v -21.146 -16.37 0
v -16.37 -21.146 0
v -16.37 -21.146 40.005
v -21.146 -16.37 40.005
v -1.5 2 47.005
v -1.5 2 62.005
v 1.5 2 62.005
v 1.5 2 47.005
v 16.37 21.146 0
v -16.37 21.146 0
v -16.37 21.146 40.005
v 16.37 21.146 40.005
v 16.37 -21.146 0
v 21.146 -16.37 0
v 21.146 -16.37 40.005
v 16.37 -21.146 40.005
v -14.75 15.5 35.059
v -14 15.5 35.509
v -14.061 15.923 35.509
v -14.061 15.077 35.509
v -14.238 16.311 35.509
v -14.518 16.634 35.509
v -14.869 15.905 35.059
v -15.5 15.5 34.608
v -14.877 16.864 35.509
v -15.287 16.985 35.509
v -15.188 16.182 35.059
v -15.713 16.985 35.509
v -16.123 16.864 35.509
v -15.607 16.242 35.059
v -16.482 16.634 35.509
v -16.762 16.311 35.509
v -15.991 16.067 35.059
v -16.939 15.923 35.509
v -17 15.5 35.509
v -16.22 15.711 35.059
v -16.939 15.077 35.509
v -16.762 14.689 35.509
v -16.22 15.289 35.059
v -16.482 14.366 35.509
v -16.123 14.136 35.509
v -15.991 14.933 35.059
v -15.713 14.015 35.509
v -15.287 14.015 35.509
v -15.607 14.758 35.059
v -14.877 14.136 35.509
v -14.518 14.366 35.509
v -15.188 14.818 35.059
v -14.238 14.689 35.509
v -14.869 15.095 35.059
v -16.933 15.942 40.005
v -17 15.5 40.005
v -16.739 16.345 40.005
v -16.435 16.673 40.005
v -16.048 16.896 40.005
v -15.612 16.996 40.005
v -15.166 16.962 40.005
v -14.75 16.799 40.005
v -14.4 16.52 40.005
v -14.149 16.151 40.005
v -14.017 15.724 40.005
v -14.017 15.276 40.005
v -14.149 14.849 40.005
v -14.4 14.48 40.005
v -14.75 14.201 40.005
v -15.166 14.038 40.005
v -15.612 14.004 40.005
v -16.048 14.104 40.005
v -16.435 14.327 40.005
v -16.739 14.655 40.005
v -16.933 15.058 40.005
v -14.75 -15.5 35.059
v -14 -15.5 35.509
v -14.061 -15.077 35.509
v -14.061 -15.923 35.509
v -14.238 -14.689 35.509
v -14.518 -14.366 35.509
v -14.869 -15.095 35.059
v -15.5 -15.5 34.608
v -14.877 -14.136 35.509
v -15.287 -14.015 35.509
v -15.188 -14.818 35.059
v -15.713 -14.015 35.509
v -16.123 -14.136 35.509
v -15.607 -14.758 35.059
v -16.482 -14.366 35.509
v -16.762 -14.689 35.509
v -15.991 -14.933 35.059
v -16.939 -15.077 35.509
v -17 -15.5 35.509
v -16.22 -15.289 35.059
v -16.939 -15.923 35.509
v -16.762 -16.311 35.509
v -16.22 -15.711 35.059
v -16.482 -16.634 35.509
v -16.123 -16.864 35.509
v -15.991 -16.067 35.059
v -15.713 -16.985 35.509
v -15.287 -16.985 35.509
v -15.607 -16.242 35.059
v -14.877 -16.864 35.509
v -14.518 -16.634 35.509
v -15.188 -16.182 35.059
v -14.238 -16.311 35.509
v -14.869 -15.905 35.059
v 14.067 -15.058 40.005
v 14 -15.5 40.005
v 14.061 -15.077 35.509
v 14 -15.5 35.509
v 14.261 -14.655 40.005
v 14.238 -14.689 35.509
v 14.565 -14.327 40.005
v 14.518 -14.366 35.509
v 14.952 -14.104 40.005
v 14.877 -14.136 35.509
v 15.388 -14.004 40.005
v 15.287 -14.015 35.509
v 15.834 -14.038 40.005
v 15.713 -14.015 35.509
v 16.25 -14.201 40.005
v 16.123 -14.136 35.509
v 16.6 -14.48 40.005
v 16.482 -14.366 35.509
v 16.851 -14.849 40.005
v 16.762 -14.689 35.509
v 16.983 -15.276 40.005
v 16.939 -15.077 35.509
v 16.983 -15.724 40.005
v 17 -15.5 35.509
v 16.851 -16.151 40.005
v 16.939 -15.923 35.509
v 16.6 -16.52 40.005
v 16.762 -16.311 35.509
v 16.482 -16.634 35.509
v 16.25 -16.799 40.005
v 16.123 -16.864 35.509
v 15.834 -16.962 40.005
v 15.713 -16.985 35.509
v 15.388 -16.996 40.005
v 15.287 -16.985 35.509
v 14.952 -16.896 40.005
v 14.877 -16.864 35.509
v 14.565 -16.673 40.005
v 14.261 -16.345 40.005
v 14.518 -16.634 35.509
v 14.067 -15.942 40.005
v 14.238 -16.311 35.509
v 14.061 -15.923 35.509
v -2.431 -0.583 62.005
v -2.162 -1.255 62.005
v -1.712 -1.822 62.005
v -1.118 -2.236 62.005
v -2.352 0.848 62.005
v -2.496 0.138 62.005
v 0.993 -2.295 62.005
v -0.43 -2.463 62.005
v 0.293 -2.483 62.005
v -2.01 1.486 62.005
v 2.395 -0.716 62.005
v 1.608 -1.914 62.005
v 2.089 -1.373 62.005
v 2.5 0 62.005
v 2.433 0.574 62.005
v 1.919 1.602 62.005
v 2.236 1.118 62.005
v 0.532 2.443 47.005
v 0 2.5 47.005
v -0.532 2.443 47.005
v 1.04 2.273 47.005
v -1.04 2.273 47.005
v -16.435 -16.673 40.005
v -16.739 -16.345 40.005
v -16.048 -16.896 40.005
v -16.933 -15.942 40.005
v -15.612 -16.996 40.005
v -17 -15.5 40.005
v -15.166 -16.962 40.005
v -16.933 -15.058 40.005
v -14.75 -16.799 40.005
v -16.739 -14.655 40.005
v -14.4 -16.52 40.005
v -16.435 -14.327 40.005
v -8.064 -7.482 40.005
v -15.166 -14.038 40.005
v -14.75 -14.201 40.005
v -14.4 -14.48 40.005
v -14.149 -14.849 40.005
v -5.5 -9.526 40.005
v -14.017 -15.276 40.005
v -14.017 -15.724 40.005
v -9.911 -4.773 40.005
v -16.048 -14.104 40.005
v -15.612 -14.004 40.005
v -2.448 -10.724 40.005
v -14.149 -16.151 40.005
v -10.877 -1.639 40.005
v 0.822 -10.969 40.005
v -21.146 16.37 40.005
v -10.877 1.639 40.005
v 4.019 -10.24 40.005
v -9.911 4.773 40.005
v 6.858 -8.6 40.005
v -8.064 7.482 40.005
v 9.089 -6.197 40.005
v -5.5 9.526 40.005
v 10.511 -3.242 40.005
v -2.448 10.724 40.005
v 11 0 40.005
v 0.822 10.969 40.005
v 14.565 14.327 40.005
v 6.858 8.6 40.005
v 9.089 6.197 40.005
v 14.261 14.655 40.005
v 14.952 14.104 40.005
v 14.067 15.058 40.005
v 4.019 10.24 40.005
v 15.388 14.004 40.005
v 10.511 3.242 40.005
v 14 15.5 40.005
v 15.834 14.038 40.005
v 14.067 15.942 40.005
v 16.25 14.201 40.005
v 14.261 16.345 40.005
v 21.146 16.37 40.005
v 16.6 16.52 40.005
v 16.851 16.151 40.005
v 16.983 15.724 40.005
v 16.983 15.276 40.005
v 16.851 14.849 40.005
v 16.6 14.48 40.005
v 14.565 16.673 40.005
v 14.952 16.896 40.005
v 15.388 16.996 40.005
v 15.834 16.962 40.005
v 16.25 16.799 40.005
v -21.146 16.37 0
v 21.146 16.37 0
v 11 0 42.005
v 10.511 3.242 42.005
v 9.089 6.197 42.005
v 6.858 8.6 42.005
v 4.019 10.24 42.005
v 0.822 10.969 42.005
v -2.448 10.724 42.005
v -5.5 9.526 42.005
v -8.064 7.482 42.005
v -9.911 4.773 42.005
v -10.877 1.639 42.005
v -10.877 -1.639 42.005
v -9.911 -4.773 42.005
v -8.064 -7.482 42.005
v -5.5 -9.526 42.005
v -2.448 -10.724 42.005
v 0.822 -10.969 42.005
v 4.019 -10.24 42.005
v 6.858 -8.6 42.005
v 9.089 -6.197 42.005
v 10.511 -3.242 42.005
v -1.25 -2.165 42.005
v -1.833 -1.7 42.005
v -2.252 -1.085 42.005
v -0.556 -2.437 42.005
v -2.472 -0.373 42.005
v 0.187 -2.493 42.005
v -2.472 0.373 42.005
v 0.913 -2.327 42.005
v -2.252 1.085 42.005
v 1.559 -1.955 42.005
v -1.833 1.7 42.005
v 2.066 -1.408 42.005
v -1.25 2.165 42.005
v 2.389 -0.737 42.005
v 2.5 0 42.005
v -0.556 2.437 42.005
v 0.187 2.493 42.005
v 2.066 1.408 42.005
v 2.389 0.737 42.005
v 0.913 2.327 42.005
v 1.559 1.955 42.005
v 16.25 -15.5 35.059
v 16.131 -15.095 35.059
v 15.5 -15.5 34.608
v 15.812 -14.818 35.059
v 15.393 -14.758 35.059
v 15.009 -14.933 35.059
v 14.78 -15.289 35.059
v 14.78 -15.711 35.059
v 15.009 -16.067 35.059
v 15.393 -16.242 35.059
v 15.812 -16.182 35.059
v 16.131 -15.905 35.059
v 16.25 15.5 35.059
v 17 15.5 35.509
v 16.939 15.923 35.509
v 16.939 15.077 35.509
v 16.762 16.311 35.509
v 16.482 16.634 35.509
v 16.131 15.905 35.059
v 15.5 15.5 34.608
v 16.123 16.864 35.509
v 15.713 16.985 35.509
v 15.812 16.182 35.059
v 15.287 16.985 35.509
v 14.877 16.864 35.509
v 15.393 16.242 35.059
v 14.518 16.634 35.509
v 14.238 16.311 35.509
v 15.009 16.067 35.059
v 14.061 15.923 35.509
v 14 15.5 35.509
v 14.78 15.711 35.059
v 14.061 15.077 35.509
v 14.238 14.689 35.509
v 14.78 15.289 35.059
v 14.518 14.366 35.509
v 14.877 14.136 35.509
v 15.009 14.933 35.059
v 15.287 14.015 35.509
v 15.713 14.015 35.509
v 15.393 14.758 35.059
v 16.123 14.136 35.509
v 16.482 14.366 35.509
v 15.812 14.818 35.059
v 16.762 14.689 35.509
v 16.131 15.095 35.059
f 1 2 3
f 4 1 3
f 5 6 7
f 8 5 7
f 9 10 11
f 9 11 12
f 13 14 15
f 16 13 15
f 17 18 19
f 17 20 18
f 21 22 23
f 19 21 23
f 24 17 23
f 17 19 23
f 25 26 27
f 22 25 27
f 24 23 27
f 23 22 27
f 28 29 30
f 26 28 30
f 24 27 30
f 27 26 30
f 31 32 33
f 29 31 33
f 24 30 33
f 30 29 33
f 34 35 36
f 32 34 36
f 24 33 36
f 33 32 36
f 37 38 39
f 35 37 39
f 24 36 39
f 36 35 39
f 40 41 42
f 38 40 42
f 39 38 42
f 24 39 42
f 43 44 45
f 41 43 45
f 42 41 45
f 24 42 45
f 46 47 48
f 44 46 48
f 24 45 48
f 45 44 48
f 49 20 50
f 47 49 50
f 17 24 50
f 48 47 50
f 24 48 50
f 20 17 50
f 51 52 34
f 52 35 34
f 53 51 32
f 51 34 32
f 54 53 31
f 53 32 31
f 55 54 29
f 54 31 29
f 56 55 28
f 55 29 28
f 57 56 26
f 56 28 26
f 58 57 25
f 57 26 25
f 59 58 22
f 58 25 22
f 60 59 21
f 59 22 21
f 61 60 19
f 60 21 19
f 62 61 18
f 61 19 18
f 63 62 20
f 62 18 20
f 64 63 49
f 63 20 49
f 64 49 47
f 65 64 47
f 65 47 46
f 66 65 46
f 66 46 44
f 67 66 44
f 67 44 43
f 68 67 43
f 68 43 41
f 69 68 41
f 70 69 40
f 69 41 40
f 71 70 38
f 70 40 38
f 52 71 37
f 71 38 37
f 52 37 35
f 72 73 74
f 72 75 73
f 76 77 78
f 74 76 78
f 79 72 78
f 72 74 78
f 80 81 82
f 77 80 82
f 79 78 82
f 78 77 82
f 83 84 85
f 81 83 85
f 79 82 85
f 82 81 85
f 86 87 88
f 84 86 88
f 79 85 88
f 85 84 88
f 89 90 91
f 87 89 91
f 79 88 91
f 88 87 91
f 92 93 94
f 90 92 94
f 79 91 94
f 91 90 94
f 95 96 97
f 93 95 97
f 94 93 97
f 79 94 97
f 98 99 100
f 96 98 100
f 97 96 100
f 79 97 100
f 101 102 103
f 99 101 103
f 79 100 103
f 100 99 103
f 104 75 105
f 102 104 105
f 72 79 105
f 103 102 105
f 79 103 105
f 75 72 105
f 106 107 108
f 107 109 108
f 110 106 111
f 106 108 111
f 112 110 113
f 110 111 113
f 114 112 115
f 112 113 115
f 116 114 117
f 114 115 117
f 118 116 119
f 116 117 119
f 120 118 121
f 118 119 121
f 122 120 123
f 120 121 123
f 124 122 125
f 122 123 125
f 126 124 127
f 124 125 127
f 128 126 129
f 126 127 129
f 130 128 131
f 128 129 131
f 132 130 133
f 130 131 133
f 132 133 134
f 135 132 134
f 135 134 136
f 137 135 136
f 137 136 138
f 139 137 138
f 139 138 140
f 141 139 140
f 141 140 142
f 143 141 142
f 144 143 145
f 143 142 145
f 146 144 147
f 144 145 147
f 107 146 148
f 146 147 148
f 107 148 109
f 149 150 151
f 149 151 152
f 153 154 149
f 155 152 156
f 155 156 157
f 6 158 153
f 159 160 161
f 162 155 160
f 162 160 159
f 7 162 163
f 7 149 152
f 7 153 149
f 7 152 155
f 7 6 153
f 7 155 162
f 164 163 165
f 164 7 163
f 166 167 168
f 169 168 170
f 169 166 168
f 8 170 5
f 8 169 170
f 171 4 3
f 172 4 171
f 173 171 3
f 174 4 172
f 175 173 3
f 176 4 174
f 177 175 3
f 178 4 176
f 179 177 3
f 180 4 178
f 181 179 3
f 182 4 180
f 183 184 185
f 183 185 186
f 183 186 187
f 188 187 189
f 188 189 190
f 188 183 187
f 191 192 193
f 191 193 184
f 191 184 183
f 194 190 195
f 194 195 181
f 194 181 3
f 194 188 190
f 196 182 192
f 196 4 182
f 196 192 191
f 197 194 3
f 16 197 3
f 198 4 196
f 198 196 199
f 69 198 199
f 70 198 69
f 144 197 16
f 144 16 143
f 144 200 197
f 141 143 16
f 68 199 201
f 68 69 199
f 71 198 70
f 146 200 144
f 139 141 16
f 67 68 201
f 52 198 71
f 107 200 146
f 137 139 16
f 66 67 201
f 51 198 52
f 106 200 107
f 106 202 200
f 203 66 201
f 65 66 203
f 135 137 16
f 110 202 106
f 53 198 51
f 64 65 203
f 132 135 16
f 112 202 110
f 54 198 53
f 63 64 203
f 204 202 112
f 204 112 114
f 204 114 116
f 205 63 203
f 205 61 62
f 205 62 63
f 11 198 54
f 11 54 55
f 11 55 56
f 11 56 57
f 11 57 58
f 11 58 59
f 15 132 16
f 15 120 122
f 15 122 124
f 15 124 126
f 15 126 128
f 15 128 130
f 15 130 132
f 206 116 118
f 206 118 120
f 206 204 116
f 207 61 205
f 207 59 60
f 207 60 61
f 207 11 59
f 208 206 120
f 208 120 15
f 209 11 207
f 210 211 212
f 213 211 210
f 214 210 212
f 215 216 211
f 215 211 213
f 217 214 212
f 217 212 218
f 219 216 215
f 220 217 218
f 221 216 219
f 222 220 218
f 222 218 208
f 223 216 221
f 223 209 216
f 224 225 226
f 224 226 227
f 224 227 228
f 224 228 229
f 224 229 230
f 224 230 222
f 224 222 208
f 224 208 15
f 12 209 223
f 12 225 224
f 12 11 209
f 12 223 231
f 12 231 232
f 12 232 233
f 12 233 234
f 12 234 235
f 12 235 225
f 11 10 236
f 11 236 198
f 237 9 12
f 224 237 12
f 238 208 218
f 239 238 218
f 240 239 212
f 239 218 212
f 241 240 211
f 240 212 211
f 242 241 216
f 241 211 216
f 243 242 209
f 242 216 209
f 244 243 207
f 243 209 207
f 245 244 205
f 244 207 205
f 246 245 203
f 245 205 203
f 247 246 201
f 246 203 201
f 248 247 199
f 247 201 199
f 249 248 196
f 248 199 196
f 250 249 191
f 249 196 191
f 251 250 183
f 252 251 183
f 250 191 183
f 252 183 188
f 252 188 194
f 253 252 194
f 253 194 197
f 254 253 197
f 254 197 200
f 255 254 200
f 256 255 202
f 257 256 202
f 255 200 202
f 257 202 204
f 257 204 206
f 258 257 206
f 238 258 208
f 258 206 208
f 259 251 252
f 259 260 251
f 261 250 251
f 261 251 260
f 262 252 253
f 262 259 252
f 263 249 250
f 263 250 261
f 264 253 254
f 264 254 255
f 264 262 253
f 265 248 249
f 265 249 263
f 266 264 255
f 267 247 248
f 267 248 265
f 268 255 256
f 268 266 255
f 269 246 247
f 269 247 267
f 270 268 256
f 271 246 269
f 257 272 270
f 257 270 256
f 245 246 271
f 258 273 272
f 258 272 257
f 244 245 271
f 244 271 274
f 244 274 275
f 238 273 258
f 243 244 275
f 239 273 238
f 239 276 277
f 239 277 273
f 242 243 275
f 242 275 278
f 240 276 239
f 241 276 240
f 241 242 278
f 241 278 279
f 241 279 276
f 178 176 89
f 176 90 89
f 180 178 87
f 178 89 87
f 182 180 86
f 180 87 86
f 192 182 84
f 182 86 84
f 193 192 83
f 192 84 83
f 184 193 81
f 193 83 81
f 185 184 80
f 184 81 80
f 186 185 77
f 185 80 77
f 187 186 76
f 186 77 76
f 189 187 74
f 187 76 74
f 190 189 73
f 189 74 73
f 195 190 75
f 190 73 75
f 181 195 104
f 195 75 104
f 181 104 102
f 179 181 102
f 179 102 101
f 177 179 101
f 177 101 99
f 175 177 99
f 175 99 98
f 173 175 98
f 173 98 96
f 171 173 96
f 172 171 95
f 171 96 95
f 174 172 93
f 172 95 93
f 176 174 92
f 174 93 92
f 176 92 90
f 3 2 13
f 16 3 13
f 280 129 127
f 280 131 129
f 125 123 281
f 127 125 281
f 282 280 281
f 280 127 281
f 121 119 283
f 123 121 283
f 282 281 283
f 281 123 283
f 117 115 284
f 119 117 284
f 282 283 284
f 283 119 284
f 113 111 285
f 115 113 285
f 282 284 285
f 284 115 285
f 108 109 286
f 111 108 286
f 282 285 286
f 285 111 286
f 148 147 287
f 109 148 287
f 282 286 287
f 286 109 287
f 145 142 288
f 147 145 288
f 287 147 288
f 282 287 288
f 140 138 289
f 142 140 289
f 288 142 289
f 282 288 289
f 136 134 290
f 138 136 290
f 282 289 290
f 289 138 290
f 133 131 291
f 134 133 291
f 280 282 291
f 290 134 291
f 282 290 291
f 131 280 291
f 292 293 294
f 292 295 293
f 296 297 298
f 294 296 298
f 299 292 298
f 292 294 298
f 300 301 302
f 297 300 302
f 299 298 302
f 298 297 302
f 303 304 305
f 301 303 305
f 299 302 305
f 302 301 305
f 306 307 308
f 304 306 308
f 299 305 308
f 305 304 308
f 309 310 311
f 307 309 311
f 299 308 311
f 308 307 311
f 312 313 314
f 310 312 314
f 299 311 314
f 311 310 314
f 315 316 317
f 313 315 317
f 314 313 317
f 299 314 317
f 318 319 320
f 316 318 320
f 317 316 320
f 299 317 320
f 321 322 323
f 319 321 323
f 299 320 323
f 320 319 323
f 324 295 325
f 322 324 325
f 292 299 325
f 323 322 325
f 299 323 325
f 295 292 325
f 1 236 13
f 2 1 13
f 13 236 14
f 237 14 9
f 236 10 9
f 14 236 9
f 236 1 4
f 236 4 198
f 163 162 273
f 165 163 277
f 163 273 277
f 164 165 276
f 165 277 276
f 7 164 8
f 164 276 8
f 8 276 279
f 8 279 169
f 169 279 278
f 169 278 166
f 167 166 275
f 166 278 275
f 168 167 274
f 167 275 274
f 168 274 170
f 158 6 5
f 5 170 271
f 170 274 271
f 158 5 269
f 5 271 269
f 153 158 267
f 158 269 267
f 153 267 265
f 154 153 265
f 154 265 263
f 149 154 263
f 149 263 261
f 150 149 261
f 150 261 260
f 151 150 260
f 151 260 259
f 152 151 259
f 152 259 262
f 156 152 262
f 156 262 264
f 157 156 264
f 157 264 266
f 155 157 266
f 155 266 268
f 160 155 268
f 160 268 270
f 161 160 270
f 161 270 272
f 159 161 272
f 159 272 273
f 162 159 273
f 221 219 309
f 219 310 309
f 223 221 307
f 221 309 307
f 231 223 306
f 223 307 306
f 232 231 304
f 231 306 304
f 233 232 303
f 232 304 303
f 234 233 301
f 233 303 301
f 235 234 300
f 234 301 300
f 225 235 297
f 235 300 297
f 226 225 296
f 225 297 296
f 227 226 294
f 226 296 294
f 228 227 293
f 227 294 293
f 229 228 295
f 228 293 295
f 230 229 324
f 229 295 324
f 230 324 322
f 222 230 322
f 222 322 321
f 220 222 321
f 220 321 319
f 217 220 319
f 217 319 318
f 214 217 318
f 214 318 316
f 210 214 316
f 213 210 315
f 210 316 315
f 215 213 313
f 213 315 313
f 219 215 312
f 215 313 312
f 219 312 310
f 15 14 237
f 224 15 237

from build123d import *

# Parameters (mm, degrees)
F0_W      = 42.291
F0_H      = 42.291
F1_DEPTH  = 40.005
F2_SIZE   = 4.7752
F3_R      = 11
F4_DEPTH  = 2
F5_R      = 2.5
F6_DEPTH  = 22
F8_DEPTH  = 15
F10_D     = 3
F10_DEPTH = 4.4958
F10_TIP   = 0.9012909285


with BuildPart() as f1:
    # F0 (on Top) → F1 (new body)
    with BuildSketch(Plane.XY):
        Rectangle(F0_W, F0_H)
    extrude(amount=F1_DEPTH)

    # F2
    f2_edges = [f1.edges().sort_by_distance(p)[0] for p in [
        (21.1455, -21.1455, 20.0025),
        (21.1455, 21.1455, 20.0025),
        (-21.1455, 21.1455, 20.0025),
        (-21.1455, -21.1455, 20.0025),
    ]]
    chamfer(f2_edges, length=F2_SIZE)

    # F3 (on face) → F4 (join)
    with BuildSketch(Plane.XY.offset(40.005)):
        Circle(F3_R)
    extrude(amount=F4_DEPTH)

    # F5 (on face) → F6 (join)
    with BuildSketch(Plane.XY.offset(40.005)):
        Circle(F5_R)
    extrude(amount=F6_DEPTH)

    # F7 (on face) → F8 (cut)
    with BuildSketch(Plane.XY.offset(62.005)):
        with BuildLine():
            ThreePointArc((1.5, 2), (0.790569415, 2.3717082451), (0, 2.5))
            ThreePointArc((0, 2.5), (-0.790569415, 2.3717082451), (-1.5, 2))
            Line((-1.5, 2), (1.5, 2))
        make_face()
    extrude(amount=-F8_DEPTH, mode=Mode.SUBTRACT)

    # F10
    with Locations(Plane.XY.offset(40.005)):
        with Locations((-15.5, 15.5), (-15.5, -15.5), (15.5, -15.5), (15.5, 15.5)):
            Hole(F10_D / 2, depth=F10_DEPTH)
            with Locations((0, 0, -(F10_DEPTH + F10_TIP / 2))):  # 118° drill point
                Cone(0, F10_D / 2, F10_TIP, mode=Mode.SUBTRACT)


solid = f1.part
